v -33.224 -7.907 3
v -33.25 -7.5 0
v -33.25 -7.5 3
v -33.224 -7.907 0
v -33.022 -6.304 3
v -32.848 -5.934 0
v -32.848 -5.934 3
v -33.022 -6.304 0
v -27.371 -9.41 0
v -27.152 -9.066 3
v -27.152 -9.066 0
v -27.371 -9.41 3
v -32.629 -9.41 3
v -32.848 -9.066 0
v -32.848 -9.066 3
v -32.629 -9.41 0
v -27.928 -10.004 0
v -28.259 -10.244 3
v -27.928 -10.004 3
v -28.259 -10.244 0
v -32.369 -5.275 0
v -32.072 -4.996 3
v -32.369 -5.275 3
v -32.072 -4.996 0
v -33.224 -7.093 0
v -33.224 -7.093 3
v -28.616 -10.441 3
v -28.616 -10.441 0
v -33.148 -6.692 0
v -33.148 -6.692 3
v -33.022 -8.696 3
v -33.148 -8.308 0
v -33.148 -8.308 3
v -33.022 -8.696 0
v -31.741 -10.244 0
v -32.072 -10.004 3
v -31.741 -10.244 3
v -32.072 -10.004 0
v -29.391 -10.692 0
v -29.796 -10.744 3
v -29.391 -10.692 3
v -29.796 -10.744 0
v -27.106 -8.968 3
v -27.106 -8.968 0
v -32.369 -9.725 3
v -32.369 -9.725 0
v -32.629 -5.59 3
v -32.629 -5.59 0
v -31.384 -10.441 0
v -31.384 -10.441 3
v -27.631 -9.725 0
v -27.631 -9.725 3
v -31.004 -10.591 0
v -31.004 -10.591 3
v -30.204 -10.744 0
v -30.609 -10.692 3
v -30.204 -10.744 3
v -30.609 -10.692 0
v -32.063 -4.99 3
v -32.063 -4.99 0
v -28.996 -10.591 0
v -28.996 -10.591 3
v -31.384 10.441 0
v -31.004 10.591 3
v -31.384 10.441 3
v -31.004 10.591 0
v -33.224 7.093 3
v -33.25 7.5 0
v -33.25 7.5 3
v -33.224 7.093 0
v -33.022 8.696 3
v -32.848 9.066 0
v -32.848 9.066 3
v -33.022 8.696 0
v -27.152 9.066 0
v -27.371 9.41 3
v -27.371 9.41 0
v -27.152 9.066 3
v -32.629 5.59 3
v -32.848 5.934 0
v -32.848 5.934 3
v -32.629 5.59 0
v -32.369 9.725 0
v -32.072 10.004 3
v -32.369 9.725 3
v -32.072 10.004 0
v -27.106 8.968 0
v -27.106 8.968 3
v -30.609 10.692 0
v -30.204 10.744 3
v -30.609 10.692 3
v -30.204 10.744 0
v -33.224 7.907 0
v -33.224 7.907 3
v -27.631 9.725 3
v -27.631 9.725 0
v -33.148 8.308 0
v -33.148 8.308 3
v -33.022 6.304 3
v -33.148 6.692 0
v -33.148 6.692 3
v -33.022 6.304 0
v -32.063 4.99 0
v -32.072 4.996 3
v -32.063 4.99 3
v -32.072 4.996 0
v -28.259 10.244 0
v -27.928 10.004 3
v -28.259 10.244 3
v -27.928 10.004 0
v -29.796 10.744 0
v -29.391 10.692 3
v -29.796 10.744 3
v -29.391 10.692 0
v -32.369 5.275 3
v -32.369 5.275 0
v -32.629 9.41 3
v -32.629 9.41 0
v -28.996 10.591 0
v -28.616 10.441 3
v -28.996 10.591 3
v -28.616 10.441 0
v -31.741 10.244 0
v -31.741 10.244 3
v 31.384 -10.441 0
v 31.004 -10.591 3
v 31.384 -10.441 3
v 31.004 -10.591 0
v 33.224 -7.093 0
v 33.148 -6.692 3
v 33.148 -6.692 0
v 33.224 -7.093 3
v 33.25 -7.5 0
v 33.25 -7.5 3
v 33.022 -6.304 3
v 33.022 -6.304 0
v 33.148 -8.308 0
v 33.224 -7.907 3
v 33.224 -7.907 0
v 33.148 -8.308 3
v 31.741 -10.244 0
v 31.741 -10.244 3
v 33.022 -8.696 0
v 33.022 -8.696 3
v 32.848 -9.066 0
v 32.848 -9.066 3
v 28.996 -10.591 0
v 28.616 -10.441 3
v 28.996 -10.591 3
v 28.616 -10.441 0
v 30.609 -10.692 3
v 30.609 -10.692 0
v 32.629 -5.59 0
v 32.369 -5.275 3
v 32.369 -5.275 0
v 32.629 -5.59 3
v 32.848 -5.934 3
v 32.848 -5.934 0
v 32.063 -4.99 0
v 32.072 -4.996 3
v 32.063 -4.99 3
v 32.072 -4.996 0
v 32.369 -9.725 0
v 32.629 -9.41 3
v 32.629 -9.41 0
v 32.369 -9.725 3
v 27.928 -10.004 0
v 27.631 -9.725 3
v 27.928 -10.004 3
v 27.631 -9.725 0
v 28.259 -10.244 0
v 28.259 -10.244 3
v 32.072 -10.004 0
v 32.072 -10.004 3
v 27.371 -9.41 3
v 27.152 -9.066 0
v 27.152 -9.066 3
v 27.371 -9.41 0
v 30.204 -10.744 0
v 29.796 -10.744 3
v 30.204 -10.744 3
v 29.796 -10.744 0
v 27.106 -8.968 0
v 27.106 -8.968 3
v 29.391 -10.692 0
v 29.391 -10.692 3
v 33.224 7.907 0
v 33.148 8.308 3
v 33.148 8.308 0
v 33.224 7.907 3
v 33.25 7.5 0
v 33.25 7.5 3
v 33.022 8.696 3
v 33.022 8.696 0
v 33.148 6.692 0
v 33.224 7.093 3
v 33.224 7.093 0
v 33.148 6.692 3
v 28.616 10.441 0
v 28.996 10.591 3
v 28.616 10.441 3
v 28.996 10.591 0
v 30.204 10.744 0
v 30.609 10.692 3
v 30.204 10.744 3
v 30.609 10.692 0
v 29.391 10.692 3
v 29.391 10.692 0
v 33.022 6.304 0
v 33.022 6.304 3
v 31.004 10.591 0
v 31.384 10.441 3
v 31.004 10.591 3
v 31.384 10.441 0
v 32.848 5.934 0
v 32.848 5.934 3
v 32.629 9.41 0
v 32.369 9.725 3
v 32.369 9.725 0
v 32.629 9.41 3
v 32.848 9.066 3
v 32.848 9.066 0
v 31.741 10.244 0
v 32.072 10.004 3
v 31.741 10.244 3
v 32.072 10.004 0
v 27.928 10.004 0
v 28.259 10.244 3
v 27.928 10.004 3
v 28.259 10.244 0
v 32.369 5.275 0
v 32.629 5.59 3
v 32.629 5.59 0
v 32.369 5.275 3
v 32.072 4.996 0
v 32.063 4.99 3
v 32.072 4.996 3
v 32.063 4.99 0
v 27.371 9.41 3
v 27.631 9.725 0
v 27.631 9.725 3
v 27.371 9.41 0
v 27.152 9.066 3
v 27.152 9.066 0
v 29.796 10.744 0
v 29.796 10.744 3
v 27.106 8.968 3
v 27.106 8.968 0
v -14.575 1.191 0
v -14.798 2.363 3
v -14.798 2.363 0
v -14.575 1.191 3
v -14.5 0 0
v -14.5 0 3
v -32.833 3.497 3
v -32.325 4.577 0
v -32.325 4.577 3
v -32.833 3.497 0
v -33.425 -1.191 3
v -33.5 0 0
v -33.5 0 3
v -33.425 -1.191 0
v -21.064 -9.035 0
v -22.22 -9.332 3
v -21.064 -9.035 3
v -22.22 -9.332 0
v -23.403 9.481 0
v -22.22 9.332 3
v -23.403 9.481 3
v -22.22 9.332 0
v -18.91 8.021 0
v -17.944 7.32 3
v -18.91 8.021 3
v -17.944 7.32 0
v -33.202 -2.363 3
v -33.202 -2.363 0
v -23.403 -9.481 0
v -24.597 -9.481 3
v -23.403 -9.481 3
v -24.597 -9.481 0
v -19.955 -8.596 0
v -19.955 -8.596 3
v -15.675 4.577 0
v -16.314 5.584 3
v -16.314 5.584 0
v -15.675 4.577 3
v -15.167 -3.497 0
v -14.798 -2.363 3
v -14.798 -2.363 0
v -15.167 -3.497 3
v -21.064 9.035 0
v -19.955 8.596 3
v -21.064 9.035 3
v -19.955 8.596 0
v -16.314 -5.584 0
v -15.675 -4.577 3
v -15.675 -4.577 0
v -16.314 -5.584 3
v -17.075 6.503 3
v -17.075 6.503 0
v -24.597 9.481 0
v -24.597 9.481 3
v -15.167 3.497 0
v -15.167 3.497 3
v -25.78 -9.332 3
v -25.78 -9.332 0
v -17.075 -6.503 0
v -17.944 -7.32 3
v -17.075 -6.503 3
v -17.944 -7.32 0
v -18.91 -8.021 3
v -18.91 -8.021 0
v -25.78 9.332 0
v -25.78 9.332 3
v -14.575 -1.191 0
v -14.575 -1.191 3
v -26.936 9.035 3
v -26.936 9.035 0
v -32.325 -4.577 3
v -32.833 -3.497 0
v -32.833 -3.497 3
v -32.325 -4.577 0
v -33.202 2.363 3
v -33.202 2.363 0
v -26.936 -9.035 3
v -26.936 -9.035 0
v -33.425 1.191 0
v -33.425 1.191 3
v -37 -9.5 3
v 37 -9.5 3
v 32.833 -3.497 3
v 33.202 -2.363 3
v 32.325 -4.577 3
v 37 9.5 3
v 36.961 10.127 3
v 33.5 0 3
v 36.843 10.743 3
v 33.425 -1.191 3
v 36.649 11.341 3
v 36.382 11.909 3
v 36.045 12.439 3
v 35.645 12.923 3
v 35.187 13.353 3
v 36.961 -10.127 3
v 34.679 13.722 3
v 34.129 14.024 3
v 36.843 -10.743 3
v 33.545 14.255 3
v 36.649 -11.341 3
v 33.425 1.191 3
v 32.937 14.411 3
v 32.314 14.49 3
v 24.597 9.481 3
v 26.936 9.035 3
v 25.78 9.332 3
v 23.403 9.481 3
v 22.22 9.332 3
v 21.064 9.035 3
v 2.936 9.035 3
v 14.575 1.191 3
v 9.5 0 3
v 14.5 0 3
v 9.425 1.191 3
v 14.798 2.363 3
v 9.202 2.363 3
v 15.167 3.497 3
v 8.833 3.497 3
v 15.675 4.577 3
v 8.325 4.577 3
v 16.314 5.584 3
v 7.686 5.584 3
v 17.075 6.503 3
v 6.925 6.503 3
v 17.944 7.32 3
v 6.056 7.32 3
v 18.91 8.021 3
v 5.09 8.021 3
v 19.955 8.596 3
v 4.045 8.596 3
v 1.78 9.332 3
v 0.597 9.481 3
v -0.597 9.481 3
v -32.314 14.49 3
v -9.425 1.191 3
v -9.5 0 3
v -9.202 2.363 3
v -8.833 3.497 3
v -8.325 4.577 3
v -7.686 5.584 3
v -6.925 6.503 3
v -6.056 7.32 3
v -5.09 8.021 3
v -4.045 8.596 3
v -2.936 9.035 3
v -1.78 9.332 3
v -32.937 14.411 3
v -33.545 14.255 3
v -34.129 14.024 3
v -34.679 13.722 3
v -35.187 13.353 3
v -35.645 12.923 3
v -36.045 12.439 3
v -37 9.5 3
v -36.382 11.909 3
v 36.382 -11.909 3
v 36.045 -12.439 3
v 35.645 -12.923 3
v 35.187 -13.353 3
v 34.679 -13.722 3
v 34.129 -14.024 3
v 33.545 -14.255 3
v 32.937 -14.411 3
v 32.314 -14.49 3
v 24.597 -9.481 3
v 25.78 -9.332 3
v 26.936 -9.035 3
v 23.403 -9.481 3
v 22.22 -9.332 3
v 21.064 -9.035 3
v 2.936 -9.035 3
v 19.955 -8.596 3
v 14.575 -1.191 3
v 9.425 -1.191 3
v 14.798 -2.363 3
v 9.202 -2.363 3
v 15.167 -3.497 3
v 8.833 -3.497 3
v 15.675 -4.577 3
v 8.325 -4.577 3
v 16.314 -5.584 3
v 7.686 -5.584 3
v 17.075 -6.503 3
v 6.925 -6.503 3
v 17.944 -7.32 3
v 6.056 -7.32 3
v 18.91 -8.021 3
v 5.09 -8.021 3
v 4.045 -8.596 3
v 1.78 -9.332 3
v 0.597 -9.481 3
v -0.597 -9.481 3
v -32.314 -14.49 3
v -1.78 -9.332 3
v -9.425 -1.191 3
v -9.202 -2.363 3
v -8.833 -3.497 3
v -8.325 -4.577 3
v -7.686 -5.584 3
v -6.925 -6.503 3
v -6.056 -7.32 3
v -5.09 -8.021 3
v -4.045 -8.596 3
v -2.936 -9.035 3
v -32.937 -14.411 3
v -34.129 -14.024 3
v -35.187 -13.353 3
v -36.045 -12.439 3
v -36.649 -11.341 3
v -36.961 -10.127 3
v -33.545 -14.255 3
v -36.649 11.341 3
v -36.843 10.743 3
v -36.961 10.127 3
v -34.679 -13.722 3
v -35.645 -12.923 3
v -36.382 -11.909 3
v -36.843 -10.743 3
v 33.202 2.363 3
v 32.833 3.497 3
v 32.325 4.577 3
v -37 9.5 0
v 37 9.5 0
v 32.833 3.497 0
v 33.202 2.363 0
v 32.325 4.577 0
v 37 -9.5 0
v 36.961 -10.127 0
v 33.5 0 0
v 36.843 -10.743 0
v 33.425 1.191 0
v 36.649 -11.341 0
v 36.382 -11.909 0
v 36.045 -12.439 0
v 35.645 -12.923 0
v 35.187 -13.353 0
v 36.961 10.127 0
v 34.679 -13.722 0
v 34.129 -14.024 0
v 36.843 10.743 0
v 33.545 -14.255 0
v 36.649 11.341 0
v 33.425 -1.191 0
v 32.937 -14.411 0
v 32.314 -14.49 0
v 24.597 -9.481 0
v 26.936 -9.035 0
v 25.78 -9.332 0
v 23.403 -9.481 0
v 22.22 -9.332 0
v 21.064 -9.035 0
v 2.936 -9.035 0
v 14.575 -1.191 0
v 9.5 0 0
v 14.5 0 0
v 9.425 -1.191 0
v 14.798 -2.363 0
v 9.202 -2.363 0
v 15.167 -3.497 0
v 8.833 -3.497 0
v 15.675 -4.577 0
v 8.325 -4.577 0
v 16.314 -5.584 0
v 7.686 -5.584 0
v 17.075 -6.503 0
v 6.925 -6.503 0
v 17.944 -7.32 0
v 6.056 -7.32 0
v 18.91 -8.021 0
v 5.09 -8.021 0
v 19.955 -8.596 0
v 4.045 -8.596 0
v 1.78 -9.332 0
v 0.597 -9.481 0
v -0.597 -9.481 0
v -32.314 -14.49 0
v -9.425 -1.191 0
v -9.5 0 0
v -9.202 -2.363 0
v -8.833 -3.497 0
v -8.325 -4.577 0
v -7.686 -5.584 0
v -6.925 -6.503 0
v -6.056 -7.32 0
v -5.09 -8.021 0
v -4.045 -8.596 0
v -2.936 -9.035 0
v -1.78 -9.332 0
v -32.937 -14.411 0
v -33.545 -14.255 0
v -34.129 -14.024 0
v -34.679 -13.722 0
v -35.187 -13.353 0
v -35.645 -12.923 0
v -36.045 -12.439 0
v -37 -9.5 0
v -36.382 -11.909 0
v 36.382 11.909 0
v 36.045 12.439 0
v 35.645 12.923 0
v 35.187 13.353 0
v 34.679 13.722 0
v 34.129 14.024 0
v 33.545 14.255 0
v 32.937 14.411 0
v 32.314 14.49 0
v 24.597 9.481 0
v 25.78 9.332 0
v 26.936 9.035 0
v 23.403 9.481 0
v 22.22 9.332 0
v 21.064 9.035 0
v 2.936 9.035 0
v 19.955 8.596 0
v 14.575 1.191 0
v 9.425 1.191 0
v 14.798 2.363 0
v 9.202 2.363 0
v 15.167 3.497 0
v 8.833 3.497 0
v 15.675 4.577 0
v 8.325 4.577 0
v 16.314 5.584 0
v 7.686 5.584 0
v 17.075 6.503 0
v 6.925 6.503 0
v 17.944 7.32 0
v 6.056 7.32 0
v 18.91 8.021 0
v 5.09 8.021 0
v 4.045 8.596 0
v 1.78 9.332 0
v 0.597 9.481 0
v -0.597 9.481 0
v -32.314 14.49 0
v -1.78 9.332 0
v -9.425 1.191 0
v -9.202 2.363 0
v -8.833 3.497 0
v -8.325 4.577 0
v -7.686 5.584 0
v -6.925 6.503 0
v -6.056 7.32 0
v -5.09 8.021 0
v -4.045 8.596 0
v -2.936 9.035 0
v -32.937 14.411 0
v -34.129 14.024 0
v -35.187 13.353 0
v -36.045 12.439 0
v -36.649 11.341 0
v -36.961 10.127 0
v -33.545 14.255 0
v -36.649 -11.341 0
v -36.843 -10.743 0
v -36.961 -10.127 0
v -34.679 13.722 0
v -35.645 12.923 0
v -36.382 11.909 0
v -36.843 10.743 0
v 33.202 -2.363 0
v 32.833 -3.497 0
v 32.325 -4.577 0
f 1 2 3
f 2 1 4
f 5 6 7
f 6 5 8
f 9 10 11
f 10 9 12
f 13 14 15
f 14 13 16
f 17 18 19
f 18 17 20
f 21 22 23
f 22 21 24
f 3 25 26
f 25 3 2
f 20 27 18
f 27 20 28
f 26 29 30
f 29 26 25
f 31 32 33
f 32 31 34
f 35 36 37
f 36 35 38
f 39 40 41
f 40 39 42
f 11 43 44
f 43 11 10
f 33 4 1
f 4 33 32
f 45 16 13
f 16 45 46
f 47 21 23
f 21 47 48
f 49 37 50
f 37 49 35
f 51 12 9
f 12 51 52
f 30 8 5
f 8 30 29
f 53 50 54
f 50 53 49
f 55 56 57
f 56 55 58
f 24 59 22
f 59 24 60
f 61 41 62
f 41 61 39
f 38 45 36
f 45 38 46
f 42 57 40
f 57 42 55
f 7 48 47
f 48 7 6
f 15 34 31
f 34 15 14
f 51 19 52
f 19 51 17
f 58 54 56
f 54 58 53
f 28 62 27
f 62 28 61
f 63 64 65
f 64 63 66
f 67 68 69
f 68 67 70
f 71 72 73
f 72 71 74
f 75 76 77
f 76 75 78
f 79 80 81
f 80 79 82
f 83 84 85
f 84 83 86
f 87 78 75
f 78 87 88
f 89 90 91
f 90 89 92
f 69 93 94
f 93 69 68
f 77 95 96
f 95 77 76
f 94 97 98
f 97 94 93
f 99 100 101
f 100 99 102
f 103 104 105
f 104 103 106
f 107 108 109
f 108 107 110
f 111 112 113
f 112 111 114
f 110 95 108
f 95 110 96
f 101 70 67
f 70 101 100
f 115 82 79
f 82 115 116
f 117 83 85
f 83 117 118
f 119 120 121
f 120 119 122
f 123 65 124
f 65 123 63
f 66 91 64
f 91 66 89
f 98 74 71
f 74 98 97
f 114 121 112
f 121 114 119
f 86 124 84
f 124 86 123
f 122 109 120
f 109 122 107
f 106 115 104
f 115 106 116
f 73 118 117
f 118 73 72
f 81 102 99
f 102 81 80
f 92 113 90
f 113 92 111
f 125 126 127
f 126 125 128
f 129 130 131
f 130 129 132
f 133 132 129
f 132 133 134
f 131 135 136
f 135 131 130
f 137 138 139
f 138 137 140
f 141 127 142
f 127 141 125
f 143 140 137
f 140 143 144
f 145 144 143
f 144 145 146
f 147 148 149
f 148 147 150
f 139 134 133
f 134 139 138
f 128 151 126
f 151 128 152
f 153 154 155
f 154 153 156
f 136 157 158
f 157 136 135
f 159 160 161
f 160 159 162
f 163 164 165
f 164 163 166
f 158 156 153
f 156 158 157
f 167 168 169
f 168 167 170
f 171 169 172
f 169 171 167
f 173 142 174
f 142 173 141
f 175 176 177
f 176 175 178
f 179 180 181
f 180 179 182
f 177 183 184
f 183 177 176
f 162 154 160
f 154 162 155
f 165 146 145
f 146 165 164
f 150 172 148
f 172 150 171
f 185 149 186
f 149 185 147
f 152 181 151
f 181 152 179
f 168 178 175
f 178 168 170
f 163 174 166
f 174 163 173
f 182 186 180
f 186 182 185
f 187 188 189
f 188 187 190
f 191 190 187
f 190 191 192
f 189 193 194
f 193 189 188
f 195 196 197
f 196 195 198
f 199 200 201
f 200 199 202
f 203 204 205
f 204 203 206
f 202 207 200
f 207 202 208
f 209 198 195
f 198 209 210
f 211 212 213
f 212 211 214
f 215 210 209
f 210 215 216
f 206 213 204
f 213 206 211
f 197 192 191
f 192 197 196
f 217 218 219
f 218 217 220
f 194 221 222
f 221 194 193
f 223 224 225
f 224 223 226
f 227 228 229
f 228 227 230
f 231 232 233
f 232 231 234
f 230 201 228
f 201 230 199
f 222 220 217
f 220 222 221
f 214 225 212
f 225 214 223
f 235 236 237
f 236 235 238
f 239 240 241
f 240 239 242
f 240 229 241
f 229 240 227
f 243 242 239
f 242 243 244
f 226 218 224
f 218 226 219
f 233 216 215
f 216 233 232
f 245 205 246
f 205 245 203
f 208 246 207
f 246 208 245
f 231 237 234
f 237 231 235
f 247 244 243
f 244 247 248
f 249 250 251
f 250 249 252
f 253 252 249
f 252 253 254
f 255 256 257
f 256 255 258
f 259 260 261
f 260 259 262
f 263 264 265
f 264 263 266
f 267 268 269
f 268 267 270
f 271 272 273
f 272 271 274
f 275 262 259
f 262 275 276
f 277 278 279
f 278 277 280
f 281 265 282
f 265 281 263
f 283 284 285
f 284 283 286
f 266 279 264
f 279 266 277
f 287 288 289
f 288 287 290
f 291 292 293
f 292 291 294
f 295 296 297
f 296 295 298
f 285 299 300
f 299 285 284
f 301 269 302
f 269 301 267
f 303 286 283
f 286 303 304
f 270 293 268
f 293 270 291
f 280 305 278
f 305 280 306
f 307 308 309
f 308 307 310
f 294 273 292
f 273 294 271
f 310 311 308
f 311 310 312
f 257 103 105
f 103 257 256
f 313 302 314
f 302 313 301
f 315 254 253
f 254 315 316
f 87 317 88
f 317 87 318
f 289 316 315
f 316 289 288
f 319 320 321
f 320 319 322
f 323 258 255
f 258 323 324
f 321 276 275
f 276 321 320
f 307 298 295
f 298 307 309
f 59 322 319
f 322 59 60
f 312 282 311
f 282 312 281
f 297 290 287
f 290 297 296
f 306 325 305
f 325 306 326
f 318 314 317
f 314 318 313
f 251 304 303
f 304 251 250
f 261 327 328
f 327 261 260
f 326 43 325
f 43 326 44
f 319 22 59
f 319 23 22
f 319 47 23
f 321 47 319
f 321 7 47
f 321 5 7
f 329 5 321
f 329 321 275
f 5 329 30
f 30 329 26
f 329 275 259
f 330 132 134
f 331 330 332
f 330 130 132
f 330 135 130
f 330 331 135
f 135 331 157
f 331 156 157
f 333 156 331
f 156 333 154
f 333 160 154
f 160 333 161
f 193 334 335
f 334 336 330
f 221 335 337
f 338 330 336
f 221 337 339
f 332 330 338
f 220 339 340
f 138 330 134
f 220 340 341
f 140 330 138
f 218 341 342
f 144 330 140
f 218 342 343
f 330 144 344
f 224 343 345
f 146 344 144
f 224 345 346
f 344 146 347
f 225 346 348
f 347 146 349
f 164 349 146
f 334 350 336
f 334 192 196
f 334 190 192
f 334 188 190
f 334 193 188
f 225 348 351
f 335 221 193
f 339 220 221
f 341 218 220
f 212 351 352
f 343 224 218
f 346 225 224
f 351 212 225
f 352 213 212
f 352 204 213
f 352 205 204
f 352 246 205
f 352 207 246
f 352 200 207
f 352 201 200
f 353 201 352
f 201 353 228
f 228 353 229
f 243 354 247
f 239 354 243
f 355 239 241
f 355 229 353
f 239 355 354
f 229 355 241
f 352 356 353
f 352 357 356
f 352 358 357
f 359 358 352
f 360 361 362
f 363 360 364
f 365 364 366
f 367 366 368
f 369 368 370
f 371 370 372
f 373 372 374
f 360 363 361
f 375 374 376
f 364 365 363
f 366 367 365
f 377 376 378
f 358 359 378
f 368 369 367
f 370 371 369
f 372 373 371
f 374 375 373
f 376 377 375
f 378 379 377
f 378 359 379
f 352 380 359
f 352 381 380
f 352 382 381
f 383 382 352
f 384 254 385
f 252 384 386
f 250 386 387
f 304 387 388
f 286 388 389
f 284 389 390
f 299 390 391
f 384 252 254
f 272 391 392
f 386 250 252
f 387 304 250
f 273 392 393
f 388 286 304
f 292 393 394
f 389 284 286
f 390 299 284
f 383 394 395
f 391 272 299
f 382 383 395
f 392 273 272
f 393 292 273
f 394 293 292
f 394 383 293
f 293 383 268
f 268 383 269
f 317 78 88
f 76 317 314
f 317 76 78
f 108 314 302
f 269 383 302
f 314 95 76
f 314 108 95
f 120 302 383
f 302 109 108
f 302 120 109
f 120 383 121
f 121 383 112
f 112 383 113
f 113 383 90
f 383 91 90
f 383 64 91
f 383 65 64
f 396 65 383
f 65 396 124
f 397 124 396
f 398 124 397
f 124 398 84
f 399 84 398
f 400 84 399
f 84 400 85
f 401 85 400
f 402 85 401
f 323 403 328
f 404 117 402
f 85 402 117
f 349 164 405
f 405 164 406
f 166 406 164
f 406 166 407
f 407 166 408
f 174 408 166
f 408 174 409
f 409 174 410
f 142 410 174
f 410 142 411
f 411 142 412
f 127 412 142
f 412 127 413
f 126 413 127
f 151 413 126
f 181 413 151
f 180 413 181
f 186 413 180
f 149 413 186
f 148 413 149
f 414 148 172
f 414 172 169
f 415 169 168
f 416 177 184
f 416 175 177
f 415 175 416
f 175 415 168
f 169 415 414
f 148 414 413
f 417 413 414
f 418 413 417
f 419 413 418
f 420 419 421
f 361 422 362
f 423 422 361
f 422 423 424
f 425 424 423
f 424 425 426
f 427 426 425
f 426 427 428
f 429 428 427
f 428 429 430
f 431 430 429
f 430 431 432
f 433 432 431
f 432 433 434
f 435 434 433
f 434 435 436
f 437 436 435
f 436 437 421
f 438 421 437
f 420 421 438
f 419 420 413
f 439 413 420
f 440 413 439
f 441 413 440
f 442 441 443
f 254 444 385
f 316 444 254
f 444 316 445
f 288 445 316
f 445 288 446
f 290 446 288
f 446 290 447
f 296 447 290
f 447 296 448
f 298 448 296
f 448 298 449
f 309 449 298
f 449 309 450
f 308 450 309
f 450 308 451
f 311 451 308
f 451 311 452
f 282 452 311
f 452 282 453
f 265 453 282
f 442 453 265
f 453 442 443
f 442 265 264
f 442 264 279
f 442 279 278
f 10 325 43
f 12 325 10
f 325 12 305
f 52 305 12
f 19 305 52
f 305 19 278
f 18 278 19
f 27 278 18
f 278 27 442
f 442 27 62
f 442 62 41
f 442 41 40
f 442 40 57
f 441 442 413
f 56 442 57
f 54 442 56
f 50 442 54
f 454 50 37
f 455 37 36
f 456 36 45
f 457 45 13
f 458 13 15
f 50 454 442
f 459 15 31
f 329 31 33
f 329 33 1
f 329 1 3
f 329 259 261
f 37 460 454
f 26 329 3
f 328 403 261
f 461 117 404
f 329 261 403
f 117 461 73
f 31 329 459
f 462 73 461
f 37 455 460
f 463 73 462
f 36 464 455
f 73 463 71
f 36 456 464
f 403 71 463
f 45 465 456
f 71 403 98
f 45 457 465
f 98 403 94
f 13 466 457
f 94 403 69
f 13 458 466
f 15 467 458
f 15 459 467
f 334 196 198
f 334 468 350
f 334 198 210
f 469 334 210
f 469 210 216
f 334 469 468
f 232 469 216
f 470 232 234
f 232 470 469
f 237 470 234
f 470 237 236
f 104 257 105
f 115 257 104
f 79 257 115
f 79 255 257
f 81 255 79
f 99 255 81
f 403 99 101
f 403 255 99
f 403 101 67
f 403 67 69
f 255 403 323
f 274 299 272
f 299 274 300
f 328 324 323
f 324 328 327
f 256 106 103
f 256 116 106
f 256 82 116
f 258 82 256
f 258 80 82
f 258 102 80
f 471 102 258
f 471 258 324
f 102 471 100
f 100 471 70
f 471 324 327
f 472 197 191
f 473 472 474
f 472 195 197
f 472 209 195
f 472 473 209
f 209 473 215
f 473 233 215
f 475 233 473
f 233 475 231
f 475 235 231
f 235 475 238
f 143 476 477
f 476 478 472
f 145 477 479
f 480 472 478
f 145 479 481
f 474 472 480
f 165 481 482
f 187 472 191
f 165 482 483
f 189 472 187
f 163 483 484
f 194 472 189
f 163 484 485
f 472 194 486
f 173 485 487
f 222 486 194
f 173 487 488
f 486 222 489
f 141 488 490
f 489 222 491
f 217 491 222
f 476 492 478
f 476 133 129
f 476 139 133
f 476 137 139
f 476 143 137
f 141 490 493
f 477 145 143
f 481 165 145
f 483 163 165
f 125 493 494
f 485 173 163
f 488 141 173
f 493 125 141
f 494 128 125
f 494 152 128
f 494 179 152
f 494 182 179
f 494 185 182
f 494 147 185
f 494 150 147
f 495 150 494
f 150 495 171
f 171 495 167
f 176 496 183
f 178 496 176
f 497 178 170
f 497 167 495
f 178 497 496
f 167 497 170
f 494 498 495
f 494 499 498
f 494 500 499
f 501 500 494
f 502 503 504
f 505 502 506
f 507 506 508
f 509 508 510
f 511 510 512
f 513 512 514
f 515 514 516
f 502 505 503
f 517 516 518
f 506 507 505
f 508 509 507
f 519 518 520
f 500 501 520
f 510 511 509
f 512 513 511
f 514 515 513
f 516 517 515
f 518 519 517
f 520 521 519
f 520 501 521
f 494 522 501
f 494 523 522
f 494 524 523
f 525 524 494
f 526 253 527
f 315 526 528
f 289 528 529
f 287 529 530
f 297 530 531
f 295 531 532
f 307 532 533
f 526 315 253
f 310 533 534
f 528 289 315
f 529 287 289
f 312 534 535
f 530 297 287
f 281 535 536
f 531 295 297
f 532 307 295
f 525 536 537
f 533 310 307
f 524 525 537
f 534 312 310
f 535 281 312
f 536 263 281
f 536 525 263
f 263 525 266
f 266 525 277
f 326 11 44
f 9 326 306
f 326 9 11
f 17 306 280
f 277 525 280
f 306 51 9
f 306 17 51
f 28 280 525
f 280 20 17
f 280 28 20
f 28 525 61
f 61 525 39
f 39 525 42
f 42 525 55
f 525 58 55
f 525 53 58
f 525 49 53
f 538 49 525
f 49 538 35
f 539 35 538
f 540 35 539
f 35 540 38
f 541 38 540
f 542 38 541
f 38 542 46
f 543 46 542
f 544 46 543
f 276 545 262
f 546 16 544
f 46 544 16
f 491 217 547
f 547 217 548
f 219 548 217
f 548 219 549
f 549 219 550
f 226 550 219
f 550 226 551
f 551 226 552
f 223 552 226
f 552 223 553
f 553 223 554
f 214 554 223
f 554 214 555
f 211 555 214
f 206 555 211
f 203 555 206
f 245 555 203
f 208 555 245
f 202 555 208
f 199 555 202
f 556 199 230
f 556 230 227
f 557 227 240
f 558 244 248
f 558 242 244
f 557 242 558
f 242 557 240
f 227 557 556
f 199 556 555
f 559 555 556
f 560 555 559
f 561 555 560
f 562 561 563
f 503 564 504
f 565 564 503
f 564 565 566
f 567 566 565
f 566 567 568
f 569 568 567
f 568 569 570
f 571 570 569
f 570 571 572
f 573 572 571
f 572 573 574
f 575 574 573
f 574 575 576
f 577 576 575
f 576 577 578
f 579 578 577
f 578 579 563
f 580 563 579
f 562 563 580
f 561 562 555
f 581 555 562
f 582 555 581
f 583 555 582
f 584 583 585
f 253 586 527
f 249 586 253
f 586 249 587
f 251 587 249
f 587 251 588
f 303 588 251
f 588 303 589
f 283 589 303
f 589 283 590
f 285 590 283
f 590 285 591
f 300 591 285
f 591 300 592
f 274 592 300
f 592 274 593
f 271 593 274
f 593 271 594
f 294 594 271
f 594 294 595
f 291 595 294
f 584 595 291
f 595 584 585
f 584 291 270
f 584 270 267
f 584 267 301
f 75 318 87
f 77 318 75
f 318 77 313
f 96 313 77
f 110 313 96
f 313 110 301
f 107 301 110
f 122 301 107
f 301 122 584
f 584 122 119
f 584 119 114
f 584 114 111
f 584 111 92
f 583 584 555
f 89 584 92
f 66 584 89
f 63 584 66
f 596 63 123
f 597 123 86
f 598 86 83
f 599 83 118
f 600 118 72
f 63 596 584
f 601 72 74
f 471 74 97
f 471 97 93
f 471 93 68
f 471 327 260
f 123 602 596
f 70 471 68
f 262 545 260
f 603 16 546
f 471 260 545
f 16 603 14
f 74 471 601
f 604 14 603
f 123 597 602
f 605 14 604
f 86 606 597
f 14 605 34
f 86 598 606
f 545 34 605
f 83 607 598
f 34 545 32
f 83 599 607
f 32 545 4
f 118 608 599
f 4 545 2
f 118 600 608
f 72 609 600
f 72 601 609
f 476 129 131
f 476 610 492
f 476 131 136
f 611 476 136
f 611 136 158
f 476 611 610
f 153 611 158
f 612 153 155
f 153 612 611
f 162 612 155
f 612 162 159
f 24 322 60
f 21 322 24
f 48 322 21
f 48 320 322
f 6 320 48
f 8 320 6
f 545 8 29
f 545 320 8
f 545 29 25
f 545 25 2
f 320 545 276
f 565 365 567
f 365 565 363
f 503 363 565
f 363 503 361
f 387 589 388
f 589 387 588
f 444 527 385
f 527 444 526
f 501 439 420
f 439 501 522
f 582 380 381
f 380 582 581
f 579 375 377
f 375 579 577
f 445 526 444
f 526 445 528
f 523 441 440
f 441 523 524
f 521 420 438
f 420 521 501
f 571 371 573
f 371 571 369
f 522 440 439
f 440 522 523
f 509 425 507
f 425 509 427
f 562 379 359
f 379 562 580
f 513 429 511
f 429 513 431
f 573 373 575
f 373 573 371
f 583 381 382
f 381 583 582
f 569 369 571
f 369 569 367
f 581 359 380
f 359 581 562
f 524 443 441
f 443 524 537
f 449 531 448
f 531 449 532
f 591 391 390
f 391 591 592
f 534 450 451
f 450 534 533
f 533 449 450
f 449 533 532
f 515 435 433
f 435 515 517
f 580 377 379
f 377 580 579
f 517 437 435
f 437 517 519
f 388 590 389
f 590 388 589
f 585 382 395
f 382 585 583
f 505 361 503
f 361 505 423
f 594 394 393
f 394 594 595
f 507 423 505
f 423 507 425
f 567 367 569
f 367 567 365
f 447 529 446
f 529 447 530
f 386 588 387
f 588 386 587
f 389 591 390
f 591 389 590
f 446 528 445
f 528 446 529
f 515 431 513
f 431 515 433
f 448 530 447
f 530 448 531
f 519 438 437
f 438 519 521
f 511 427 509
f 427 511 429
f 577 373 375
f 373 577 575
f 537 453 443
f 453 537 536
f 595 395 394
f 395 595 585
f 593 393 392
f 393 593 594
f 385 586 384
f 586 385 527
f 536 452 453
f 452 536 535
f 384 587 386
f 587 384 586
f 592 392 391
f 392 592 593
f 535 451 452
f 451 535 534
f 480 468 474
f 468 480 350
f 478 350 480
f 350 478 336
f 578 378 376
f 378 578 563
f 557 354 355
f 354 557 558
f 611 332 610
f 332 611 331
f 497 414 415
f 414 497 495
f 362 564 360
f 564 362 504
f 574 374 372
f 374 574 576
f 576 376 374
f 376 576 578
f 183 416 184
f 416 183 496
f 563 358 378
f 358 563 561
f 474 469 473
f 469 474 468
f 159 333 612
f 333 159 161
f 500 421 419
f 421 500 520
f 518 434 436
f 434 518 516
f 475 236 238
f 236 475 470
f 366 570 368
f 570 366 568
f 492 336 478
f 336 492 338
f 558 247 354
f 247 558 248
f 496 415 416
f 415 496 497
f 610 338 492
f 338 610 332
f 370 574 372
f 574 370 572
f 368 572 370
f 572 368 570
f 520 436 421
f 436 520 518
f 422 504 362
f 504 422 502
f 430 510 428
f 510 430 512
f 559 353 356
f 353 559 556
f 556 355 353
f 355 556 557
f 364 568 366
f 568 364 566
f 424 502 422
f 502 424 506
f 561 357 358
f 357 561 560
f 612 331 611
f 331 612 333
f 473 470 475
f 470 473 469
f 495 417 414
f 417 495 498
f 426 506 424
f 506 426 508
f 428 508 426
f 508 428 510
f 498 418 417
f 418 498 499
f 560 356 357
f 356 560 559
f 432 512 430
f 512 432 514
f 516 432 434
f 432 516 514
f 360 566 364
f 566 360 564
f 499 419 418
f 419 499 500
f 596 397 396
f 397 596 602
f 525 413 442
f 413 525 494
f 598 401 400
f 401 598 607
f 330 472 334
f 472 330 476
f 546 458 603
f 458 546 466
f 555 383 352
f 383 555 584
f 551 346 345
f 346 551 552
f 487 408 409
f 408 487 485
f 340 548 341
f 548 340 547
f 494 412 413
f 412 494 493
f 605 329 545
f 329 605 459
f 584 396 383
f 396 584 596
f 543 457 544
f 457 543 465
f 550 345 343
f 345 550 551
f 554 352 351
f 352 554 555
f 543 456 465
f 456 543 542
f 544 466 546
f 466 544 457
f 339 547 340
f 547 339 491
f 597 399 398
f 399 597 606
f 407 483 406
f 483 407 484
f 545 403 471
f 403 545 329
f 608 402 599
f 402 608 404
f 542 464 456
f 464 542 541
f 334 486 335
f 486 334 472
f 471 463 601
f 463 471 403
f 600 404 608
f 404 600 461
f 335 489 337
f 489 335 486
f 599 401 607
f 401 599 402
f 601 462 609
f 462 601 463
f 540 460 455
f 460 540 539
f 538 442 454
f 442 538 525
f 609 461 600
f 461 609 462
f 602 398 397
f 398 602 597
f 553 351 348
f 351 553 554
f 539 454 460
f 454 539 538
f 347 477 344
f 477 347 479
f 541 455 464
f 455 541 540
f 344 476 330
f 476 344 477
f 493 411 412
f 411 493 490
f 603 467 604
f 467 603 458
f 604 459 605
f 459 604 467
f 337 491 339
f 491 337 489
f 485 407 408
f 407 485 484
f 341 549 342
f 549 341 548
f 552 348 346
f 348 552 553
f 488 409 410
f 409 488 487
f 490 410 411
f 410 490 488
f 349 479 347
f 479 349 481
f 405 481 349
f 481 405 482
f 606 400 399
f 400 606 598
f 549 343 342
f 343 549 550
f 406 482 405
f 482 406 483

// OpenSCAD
$fn = 50;


difference() {
	union() {
		hull() {
			translate(v = [-32.0000000000, 9.5000000000, 0]) {
				cylinder(h = 3, r = 5);
			}
			translate(v = [32.0000000000, 9.5000000000, 0]) {
				cylinder(h = 3, r = 5);
			}
			translate(v = [-32.0000000000, -9.5000000000, 0]) {
				cylinder(h = 3, r = 5);
			}
			translate(v = [32.0000000000, -9.5000000000, 0]) {
				cylinder(h = 3, r = 5);
			}
		}
	}
	union() {
		#translate(v = [-30.0000000000, -7.5000000000, -100.0000000000]) {
			cylinder(h = 200, r = 3.2500000000);
		}
		#translate(v = [-30.0000000000, 7.5000000000, -100.0000000000]) {
			cylinder(h = 200, r = 3.2500000000);
		}
		#translate(v = [30.0000000000, -7.5000000000, -100.0000000000]) {
			cylinder(h = 200, r = 3.2500000000);
		}
		#translate(v = [30.0000000000, 7.5000000000, -100.0000000000]) {
			cylinder(h = 200, r = 3.2500000000);
		}
		#translate(v = [-24.0000000000, 0, 0]) {
			cylinder(h = 3, r = 9.5000000000);
		}
		#cylinder(h = 3, r = 9.5000000000);
		#translate(v = [24.0000000000, 0, 0]) {
			cylinder(h = 3, r = 9.5000000000);
		}
	}
}
